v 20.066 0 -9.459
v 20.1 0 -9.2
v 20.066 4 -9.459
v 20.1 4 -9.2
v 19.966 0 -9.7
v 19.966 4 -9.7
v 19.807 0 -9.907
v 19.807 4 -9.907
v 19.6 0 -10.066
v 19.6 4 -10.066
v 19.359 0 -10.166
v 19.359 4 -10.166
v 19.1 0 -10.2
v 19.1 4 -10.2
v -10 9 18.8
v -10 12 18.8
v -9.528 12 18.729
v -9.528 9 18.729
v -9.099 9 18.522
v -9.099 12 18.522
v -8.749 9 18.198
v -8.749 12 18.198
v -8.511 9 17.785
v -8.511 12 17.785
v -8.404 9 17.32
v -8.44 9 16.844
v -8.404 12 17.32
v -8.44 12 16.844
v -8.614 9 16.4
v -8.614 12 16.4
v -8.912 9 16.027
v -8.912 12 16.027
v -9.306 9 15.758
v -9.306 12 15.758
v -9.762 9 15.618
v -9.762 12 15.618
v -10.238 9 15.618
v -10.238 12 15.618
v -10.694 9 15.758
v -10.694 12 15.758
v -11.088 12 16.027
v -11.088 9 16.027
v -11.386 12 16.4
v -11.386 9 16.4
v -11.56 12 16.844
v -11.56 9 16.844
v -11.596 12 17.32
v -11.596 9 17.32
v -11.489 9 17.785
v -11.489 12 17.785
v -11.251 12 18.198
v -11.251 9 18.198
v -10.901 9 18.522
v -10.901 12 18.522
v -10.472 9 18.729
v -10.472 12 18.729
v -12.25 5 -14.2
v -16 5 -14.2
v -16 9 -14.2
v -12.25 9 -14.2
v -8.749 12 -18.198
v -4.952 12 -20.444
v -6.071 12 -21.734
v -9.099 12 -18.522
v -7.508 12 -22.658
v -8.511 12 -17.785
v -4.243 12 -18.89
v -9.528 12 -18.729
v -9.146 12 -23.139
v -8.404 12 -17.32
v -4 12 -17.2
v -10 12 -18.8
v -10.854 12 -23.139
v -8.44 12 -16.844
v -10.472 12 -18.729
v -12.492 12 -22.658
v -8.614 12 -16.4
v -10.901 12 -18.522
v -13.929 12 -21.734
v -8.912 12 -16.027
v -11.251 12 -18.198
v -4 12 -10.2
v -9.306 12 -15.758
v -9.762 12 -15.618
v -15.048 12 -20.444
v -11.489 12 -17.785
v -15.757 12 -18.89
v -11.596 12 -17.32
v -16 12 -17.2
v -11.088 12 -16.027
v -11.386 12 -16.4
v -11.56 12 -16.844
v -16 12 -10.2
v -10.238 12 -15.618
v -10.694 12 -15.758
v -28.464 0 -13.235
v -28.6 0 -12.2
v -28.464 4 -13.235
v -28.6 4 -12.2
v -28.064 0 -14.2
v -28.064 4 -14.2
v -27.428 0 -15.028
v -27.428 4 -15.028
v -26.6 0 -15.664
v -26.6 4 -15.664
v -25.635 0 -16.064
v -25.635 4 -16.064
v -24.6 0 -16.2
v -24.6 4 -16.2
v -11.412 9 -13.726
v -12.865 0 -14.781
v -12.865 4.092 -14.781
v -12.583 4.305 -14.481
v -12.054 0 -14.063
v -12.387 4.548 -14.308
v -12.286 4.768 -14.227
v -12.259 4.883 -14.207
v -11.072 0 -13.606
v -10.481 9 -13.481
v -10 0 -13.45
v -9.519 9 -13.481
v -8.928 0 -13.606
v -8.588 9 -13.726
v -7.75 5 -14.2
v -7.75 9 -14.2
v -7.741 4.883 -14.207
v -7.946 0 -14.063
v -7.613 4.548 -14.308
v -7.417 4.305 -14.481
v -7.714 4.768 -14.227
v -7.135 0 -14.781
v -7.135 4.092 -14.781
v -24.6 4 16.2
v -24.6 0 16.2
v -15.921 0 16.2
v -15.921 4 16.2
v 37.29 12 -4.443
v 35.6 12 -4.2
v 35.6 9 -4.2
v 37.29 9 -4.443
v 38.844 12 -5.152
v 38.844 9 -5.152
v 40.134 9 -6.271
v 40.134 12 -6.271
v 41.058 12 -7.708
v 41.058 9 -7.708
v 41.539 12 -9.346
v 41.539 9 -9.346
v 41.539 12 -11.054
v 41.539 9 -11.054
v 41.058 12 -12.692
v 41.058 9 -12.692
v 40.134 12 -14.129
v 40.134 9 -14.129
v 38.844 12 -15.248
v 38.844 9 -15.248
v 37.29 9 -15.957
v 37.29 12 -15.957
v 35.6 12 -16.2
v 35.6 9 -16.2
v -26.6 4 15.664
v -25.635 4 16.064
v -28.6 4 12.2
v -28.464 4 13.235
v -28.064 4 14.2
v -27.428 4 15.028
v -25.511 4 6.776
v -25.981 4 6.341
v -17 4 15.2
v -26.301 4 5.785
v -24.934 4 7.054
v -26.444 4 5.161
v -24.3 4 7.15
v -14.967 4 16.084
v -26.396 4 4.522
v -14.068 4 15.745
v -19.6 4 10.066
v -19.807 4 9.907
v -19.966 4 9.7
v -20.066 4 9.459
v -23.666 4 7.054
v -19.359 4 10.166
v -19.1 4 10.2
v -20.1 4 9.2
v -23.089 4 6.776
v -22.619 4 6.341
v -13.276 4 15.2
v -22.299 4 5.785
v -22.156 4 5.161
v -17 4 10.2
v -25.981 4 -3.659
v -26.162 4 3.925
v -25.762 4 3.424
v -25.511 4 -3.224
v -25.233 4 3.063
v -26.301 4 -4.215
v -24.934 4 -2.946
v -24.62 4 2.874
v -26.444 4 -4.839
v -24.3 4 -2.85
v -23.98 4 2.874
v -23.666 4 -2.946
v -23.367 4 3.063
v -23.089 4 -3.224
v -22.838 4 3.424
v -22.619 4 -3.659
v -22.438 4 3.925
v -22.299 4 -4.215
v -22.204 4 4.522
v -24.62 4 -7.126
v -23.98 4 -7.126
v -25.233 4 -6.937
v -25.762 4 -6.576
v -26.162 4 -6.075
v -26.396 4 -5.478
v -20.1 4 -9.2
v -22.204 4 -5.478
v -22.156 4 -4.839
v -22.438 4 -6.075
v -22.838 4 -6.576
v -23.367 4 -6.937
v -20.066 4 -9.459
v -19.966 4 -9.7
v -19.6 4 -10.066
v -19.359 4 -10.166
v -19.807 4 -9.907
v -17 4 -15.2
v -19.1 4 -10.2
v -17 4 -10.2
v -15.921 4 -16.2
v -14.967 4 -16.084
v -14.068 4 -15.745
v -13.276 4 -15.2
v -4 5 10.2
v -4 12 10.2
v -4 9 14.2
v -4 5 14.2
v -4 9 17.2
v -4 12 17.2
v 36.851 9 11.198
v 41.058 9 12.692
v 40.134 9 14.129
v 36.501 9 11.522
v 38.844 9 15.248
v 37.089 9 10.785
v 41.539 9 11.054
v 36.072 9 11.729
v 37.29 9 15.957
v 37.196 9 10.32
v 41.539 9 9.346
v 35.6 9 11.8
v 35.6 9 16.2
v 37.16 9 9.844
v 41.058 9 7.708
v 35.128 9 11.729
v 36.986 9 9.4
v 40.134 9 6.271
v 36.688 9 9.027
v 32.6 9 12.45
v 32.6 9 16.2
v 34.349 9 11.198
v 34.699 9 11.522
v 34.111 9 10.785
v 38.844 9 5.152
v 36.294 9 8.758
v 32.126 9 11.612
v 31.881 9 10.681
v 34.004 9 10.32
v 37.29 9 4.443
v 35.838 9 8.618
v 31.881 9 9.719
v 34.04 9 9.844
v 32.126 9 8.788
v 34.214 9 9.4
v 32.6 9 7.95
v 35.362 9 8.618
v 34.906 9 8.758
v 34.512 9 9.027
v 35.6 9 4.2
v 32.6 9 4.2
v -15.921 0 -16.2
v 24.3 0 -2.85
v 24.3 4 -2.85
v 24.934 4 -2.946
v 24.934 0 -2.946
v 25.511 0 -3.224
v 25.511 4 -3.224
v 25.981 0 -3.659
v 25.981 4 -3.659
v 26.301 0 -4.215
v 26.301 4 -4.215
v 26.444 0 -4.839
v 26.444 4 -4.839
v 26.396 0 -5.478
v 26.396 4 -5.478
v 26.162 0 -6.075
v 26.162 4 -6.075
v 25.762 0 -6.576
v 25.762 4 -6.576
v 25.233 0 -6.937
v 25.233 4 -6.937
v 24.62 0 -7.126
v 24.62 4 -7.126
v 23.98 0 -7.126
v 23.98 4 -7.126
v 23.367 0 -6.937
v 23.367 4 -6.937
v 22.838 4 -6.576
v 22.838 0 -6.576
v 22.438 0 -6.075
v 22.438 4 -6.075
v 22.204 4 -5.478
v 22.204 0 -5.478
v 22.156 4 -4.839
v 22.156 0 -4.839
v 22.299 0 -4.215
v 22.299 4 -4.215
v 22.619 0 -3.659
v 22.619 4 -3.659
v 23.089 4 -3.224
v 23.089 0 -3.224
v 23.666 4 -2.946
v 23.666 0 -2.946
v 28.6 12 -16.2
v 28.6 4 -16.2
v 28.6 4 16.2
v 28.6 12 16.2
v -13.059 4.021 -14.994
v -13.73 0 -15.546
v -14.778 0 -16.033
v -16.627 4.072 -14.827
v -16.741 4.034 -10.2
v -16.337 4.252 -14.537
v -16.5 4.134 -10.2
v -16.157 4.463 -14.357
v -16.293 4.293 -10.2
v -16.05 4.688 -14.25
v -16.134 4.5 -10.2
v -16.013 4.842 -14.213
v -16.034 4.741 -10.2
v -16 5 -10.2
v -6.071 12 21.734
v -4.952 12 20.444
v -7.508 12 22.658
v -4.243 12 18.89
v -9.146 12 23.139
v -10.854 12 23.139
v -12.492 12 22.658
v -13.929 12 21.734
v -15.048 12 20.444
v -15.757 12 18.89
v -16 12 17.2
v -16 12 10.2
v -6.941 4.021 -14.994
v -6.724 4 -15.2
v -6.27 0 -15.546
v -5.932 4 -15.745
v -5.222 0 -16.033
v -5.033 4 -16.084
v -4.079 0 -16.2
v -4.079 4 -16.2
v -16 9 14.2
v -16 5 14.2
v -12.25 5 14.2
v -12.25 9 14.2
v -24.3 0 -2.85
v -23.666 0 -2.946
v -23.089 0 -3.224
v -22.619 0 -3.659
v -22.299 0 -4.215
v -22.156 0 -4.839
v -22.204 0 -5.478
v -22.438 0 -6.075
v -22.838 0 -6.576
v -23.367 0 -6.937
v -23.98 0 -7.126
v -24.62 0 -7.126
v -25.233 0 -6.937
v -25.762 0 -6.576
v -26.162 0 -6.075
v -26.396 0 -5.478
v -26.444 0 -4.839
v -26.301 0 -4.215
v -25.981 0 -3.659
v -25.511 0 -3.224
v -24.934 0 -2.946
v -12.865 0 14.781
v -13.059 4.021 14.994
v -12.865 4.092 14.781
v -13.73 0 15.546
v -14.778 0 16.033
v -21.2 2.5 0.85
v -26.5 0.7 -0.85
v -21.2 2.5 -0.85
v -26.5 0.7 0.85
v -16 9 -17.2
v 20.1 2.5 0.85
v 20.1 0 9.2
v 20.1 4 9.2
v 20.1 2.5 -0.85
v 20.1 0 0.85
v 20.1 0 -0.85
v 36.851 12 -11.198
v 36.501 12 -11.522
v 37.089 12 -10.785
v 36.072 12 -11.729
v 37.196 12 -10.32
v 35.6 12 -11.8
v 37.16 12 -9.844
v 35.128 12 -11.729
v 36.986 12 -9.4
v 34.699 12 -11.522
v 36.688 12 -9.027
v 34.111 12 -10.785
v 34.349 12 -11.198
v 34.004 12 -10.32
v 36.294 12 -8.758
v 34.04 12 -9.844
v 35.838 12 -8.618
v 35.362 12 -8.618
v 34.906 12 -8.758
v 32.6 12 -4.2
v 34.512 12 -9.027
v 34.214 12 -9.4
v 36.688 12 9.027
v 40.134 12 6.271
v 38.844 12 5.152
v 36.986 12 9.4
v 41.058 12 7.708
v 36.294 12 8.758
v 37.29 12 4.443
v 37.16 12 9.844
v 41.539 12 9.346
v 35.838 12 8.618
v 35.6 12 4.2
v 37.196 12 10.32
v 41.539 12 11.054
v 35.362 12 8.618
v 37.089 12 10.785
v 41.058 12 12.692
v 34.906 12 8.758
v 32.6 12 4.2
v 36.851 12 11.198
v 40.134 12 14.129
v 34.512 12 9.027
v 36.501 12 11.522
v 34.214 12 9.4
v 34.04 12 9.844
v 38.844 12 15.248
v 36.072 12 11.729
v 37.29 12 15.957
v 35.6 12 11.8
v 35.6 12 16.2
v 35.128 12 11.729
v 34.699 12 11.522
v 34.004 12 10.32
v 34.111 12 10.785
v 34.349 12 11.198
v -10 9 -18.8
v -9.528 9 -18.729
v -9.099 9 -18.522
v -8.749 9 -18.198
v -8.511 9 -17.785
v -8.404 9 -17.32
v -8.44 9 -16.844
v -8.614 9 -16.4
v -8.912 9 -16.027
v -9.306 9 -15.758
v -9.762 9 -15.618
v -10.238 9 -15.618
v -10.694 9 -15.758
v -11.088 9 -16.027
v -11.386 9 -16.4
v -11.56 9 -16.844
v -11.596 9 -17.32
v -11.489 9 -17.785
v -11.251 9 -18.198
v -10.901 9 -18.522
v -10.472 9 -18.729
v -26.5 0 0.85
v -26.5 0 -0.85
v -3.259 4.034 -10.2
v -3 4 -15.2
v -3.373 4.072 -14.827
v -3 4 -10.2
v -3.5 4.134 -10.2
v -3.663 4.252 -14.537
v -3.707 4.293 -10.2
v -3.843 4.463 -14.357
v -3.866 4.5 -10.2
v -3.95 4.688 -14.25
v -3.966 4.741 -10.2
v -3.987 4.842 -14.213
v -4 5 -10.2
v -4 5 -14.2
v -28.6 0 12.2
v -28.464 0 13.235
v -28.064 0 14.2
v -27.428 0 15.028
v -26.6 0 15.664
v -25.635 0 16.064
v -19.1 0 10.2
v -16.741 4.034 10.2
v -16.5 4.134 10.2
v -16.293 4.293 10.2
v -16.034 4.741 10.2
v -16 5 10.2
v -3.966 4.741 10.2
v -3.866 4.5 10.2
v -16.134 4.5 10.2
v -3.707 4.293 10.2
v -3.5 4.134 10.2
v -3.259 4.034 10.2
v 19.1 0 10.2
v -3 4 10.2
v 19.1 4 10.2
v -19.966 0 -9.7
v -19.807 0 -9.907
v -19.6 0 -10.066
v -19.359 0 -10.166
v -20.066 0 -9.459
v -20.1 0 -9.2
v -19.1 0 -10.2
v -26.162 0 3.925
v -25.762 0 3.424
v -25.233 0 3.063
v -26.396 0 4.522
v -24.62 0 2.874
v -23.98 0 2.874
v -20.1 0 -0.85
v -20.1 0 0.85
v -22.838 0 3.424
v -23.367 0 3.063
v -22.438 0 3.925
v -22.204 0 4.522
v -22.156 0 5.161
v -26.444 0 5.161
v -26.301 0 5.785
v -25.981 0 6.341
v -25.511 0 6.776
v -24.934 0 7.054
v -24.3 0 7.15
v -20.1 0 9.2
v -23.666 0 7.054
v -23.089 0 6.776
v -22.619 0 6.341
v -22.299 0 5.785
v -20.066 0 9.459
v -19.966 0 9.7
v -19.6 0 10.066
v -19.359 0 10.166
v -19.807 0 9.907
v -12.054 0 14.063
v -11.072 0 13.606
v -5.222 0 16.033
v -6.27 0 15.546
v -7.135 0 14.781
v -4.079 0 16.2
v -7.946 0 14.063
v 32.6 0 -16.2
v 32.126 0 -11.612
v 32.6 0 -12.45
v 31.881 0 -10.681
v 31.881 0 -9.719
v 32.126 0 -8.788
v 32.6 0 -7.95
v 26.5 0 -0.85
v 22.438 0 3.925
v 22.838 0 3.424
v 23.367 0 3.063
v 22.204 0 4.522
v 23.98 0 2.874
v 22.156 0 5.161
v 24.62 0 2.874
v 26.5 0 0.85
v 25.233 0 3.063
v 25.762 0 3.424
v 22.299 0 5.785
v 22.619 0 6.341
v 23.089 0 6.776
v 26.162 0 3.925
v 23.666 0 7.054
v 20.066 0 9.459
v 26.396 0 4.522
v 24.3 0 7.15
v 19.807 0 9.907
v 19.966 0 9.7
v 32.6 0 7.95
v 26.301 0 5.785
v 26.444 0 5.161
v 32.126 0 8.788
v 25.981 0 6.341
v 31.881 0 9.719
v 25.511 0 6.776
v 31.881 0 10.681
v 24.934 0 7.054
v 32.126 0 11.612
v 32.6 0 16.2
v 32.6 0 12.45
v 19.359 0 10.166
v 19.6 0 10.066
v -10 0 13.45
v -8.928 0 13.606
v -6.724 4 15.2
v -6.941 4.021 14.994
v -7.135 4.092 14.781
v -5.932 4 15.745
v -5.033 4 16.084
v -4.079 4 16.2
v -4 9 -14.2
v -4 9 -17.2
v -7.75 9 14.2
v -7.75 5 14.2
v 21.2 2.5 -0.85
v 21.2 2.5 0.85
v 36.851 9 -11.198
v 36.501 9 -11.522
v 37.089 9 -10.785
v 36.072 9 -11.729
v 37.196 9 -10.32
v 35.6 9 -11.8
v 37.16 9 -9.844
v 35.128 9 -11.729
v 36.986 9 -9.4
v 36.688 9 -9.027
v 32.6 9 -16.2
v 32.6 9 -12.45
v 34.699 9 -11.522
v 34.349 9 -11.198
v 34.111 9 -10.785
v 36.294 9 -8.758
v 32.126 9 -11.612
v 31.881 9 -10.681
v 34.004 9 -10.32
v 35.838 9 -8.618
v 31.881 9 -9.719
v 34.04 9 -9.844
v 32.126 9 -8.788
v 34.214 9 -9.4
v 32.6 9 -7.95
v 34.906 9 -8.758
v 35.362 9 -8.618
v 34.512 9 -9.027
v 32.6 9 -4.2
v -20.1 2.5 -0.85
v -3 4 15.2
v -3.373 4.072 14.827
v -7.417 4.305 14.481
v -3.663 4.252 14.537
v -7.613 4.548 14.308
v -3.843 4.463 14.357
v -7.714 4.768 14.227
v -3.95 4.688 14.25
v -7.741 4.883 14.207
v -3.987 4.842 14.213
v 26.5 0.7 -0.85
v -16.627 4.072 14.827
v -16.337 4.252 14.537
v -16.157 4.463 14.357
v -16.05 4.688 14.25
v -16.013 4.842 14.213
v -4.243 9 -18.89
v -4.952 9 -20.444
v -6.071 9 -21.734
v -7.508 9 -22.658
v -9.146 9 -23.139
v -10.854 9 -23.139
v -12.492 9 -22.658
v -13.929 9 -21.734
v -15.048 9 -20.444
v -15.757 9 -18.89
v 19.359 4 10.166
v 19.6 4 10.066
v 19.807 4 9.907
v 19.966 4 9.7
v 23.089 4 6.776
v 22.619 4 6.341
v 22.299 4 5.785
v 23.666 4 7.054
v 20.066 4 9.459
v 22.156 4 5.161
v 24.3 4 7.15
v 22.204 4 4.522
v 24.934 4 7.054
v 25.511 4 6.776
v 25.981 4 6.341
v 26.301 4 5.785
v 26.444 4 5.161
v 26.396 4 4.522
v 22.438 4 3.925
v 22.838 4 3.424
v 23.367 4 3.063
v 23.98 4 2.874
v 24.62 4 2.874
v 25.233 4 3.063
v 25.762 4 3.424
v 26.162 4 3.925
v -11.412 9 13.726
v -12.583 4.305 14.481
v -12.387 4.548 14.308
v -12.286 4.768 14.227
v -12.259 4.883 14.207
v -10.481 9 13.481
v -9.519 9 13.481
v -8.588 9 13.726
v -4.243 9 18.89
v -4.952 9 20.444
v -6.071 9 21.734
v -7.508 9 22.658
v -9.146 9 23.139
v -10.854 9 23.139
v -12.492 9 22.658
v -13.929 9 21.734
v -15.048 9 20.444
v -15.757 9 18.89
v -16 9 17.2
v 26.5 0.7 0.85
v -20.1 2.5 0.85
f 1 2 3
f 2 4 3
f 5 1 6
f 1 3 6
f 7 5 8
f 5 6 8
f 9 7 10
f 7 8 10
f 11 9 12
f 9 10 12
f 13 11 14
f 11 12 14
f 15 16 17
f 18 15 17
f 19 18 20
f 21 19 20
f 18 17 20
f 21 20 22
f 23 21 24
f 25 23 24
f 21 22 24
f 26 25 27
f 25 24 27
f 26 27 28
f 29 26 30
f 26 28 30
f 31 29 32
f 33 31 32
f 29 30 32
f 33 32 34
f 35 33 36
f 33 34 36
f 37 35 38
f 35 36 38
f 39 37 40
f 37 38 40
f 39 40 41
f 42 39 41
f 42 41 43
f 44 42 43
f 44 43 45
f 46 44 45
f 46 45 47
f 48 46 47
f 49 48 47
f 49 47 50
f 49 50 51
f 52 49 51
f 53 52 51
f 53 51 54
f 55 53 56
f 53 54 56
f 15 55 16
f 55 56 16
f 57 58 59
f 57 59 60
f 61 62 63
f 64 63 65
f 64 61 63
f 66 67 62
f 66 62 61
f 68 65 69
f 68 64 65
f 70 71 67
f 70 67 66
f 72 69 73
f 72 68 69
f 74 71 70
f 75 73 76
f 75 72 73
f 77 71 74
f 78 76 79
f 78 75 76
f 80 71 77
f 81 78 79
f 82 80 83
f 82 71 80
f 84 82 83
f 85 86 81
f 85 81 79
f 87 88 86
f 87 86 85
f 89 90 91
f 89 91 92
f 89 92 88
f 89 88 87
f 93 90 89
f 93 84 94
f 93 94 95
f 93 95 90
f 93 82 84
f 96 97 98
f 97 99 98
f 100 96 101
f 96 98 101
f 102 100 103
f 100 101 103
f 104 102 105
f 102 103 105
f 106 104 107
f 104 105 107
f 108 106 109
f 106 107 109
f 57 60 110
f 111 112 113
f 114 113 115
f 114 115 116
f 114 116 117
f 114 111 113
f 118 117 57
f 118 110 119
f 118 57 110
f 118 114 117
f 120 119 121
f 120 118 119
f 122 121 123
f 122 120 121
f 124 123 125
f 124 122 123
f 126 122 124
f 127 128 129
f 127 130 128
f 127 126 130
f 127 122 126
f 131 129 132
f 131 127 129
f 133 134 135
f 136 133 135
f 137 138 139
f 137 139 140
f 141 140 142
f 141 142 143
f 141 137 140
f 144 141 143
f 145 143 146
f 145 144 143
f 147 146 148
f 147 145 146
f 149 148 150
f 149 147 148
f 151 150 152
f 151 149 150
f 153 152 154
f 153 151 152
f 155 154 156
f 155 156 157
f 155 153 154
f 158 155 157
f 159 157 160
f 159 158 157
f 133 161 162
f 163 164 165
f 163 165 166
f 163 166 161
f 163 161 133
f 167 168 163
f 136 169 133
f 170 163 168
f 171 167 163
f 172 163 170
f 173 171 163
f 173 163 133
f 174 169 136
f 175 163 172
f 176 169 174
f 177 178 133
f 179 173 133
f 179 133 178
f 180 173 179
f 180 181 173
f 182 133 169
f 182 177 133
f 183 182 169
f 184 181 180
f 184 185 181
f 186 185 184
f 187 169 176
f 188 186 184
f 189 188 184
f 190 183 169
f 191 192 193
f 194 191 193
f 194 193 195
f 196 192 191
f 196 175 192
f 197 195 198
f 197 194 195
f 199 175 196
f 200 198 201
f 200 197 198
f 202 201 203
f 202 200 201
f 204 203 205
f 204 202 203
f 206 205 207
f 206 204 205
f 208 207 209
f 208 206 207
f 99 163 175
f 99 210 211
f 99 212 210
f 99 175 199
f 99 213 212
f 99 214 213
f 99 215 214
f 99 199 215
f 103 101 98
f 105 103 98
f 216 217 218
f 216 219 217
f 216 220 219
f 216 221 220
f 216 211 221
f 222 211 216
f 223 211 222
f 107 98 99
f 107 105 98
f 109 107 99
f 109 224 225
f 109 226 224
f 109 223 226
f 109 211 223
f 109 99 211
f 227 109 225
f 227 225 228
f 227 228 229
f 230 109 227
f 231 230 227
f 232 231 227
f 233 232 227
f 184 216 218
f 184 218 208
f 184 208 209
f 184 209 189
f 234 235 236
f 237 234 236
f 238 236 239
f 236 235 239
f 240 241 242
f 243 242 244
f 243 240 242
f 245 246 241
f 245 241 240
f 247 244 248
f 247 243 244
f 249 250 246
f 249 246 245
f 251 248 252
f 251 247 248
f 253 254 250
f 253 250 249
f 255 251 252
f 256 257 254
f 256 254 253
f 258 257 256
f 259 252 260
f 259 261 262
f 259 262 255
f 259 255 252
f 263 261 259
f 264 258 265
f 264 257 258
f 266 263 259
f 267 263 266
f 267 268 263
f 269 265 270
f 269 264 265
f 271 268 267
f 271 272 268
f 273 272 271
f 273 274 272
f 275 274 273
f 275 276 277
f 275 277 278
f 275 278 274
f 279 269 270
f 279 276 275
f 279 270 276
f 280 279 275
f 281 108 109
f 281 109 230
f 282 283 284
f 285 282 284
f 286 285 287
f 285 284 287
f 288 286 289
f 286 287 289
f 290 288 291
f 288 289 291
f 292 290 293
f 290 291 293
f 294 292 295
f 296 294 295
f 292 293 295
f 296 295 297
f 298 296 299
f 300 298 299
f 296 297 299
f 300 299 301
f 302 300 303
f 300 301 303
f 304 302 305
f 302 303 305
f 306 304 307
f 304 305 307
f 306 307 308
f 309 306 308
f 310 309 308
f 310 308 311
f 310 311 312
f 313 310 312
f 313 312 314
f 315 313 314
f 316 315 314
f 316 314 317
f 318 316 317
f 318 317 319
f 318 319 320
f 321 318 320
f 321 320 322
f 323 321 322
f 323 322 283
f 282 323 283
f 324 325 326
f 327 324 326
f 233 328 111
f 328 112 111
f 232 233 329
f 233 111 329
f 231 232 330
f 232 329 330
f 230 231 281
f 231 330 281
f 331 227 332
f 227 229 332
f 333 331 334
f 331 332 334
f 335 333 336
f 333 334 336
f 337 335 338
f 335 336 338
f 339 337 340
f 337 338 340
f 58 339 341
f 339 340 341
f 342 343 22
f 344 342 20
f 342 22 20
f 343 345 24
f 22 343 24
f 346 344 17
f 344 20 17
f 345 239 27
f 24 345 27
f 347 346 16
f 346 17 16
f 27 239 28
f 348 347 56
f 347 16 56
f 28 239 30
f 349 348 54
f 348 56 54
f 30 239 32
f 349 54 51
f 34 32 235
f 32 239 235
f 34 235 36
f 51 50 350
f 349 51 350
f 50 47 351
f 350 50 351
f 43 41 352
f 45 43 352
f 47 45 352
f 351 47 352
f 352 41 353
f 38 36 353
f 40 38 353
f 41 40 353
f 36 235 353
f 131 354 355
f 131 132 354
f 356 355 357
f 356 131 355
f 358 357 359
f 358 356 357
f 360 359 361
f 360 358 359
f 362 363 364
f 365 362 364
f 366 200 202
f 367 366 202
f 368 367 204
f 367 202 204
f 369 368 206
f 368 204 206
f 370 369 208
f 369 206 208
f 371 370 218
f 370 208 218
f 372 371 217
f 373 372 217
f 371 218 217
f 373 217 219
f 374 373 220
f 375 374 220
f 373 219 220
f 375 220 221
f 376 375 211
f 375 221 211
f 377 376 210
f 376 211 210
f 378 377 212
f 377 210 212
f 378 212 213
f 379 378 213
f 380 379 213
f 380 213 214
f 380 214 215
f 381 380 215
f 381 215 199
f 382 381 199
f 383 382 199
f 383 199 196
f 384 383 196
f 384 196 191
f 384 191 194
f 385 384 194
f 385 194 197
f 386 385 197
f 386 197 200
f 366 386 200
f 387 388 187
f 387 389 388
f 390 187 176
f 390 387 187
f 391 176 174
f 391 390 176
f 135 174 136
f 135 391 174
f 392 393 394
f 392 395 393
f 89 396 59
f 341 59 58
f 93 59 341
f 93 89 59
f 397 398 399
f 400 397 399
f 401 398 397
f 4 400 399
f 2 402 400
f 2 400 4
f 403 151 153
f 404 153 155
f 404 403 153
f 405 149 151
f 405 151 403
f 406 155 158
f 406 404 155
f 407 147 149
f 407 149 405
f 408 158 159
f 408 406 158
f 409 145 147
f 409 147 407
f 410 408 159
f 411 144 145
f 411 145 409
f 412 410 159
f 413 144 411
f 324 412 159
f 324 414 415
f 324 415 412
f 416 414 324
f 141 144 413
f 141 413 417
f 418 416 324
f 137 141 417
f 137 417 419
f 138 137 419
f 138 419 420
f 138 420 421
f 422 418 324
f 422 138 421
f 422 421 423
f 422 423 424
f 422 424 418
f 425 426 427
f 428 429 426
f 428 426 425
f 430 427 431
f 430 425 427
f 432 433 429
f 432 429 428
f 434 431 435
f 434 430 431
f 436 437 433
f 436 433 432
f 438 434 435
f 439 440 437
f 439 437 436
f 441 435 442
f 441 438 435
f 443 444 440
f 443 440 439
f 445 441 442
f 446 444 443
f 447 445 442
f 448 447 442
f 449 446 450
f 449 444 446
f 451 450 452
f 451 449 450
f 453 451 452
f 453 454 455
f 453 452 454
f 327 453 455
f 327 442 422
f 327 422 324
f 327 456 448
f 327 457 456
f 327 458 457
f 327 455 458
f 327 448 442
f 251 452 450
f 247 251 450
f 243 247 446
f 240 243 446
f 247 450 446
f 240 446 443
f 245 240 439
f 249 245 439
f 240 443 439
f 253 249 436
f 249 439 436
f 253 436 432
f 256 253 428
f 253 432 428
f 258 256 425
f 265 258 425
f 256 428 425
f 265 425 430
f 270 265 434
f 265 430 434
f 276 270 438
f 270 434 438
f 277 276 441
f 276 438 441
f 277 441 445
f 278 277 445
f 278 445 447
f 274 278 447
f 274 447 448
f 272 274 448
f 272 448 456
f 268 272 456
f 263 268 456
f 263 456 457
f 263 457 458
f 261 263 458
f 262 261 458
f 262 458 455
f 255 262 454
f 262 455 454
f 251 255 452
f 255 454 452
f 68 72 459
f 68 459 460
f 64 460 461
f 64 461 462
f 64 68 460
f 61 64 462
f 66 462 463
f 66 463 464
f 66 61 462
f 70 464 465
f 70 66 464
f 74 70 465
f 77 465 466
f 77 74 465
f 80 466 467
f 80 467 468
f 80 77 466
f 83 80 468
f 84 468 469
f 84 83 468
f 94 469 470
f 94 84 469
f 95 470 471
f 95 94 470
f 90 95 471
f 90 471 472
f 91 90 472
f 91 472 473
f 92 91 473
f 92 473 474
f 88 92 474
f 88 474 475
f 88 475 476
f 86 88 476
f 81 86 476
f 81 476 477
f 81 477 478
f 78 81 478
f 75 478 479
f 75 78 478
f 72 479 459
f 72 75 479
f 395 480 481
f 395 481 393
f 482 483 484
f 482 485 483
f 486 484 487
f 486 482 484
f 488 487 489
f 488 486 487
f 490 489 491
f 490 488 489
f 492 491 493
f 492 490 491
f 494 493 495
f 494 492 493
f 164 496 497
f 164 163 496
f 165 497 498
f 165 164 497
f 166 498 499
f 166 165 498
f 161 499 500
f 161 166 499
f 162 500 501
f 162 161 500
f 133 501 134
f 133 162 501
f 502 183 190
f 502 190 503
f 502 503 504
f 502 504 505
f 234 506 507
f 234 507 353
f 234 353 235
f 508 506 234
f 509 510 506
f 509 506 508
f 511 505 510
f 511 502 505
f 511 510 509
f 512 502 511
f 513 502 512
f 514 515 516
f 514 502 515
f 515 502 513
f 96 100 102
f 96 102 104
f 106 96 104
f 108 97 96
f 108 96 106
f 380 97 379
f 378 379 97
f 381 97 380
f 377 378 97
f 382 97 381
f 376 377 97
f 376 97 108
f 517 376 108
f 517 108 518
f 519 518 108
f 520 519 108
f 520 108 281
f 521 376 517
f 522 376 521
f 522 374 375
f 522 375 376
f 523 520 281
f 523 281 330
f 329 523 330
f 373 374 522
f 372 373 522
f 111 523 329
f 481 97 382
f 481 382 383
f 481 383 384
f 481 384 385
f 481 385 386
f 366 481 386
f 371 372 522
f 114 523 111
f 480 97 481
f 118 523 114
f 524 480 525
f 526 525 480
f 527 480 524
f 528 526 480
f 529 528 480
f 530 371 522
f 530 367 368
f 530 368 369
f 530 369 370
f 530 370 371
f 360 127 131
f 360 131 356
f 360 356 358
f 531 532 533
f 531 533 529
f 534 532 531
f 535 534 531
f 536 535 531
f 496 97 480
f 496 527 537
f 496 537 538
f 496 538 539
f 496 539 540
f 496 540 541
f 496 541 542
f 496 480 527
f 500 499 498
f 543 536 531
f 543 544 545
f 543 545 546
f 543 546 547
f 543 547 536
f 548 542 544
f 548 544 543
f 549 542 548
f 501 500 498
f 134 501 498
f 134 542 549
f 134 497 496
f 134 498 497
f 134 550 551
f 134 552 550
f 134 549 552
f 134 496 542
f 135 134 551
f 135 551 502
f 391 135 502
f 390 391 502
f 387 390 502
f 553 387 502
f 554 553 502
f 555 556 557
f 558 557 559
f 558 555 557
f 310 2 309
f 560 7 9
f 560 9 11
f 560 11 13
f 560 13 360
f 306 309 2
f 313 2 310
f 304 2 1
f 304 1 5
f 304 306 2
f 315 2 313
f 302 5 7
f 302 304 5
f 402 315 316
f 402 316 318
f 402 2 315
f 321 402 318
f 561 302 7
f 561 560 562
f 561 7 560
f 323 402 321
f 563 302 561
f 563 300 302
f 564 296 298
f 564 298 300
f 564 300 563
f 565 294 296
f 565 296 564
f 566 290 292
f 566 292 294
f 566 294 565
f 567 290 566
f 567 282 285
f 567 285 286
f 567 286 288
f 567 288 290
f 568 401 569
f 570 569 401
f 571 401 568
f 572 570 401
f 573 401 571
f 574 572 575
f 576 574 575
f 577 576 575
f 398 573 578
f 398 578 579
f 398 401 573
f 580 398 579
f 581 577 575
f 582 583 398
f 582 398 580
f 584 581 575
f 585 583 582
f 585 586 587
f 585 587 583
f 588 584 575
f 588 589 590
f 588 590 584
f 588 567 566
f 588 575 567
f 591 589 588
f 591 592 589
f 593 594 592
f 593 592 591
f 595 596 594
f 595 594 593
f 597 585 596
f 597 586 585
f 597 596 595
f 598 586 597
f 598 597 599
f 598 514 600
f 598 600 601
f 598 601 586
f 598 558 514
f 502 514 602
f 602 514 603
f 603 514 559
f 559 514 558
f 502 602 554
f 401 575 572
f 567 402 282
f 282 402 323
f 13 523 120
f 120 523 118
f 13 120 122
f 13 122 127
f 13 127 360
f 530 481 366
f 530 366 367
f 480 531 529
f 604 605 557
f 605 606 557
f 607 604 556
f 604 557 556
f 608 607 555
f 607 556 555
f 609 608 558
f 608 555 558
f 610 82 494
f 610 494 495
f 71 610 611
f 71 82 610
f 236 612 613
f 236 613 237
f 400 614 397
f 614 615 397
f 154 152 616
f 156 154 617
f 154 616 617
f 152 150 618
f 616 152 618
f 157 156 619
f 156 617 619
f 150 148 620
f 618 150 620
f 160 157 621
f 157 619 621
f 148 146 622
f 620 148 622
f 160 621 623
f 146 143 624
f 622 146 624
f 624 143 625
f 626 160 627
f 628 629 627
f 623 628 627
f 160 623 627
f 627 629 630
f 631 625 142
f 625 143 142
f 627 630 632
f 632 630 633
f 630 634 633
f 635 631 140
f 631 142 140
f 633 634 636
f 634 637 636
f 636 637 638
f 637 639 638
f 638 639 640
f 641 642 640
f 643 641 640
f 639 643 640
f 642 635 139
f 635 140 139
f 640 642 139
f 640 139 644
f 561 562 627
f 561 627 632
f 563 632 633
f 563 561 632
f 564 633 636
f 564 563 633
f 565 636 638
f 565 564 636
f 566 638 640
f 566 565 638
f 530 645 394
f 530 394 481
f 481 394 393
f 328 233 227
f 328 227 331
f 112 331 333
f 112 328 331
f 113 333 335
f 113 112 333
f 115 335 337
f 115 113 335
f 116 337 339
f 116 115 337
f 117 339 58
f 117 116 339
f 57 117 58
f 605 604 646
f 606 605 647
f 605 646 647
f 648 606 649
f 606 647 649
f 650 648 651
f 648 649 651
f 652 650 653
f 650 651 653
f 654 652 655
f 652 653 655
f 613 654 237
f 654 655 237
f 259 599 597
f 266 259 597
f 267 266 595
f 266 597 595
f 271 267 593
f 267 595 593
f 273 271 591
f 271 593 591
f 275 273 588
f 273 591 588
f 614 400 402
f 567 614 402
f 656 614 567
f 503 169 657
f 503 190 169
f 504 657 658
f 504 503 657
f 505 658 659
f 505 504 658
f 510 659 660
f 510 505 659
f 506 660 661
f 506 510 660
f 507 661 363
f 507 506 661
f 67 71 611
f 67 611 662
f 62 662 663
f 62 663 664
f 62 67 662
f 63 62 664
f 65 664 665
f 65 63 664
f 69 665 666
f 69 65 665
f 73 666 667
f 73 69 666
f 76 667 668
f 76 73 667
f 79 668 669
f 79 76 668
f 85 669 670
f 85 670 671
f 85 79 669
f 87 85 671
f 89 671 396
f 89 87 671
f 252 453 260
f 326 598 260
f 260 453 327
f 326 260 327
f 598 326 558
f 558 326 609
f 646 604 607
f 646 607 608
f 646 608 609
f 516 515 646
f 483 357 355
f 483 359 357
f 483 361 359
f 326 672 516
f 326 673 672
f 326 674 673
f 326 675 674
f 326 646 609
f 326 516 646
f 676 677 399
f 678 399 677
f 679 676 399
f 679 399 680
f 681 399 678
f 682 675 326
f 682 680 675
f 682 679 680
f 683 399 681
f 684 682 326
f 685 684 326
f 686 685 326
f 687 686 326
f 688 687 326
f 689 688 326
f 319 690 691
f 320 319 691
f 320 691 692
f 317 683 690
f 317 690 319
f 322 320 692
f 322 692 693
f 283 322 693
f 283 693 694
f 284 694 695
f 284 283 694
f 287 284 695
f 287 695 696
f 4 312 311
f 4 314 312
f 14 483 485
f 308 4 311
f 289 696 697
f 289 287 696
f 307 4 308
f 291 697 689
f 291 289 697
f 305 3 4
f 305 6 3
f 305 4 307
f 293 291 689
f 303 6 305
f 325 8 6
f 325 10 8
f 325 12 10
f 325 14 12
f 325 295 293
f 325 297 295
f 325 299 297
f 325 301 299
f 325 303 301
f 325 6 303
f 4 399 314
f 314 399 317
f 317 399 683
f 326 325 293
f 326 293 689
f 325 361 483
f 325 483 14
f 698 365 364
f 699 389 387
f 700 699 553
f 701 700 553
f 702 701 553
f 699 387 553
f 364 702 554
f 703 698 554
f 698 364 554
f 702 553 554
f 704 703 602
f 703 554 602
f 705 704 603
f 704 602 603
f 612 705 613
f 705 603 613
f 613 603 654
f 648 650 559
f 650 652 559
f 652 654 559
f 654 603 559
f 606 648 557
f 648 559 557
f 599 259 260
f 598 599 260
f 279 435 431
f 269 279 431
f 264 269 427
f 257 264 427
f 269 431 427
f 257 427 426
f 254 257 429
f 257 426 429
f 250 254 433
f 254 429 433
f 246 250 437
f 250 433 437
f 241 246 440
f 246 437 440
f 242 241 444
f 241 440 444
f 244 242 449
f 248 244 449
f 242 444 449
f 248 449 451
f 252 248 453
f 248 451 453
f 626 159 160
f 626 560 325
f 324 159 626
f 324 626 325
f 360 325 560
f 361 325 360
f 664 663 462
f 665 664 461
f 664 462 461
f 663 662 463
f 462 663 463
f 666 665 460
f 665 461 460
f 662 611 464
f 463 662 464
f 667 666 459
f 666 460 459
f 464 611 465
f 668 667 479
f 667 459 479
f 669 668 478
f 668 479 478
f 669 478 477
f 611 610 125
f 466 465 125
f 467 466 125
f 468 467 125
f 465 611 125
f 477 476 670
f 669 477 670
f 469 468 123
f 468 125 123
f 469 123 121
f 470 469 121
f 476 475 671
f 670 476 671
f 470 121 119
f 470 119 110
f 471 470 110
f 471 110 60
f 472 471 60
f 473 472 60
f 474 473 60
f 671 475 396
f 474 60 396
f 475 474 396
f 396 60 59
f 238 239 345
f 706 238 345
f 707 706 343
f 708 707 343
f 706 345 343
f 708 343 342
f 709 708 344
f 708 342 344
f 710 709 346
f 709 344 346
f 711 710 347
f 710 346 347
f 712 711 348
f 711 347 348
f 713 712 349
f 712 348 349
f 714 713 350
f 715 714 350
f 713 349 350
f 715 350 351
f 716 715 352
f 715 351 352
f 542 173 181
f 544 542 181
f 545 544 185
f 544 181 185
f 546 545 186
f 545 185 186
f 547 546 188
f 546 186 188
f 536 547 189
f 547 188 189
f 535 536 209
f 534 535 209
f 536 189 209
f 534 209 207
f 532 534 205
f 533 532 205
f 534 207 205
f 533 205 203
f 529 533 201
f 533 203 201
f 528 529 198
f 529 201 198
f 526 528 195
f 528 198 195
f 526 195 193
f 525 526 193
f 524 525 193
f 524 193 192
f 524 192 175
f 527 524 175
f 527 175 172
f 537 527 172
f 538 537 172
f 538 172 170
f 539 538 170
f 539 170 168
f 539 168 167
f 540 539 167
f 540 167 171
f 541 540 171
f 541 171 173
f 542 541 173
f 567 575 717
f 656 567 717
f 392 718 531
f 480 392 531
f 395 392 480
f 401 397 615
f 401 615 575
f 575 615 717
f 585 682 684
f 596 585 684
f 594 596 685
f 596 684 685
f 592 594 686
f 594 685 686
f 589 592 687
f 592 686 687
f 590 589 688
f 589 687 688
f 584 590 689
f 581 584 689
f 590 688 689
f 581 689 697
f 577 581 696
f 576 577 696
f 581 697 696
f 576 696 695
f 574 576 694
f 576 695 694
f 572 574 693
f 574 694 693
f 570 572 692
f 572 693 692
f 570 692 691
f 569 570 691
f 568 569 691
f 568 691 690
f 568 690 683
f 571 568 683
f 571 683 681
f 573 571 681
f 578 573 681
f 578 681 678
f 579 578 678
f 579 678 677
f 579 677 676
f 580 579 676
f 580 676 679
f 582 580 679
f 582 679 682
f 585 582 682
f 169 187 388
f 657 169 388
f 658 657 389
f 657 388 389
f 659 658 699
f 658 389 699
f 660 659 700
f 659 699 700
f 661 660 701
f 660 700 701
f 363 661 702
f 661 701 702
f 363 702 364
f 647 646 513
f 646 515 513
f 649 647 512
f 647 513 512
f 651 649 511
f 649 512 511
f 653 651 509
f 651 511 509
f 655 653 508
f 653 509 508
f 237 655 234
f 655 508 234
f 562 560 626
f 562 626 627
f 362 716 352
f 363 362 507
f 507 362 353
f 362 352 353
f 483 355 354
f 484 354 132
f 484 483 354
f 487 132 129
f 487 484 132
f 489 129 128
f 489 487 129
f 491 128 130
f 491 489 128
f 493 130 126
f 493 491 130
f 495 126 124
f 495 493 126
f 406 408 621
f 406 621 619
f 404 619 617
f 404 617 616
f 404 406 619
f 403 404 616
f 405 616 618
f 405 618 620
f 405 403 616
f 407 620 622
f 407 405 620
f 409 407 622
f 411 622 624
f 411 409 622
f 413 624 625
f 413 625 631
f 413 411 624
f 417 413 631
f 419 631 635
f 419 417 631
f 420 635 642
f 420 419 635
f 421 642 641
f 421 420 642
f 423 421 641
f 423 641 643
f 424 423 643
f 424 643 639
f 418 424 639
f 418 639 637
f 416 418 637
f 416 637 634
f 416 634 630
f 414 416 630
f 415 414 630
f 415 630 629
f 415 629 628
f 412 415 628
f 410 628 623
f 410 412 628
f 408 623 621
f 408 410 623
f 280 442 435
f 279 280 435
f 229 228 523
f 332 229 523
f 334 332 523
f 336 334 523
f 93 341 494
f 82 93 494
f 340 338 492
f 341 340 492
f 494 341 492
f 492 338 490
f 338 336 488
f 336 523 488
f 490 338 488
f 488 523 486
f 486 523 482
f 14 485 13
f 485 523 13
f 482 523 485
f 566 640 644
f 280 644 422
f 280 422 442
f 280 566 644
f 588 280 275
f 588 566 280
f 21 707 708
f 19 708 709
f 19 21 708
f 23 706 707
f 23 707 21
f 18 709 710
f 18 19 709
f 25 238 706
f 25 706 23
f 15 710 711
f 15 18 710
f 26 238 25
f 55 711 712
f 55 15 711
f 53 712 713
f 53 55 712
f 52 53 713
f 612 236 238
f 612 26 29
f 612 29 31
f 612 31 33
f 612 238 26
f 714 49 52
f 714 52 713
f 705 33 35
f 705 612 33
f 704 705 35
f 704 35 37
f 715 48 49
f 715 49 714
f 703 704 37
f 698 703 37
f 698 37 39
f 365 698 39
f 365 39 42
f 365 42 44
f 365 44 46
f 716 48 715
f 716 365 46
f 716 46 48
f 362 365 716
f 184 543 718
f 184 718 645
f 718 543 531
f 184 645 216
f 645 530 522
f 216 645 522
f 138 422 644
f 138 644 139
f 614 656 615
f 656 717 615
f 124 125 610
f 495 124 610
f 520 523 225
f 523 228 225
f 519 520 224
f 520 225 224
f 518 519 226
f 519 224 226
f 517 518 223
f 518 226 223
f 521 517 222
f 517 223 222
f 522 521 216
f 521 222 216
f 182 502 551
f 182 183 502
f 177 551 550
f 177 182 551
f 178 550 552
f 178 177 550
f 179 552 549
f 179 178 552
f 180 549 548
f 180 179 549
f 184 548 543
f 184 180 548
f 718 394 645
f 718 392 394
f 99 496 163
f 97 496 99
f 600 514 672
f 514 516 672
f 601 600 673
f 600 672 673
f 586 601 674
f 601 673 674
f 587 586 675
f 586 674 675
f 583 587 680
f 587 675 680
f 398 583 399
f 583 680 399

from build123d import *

# Parameters (mm, degrees)
SKETCH1_W           = 57.2
SKETCH1_H           = 32.4
SKETCH1_W_2         = 40.2
SKETCH1_H_2         = 20.4
BOSS_EXTRUDE1_DEPTH = 4
FILLET1_R           = 1
SKETCH2_R           = 2.15
CUT_EXTRUDE1_DEPTH  = 34.111931384
CUT_EXTRUDE2_DEPTH  = 0.85
SKETCH5_W           = 12
SKETCH5_H           = 4
BOSS_EXTRUDE2_DEPTH = 8
SKETCH6_R           = 1.6
BOSS_EXTRUDE3_DEPTH = 3
CUT_EXTRUDE3_REACH  = 40.732
SKETCH7_R           = 3.75
FILLET4_R           = 4
FILLET6_R           = 1
SKETCH8_W           = 4
SKETCH8_H           = 32.4
BOSS_EXTRUDE4_DEPTH = 12
SKETCH9_R           = 1.6
BOSS_EXTRUDE6_DEPTH = 3
SKETCH10_R          = 3.75
CUT_EXTRUDE4_DEPTH  = 9


with BuildPart() as part:
    # Sketch1 → Boss-Extrude1 (new body)
    with BuildSketch(Plane(origin=(0, 0, 0), x_dir=(1, 0, 0), z_dir=(0, 1, 0))):
        Rectangle(SKETCH1_W, SKETCH1_H)
        Rectangle(SKETCH1_W_2, SKETCH1_H_2, mode=Mode.SUBTRACT)
    extrude(amount=BOSS_EXTRUDE1_DEPTH)

    # Fillet1
    fillet1_edges = [part.edges().sort_by_distance(p)[0] for p in [
        (-20.1, 2, -10.2),
        (-20.1, 2, 10.2),
        (20.1, 2, 10.2),
        (20.1, 2, -10.2),
    ]]
    fillet(fillet1_edges, radius=FILLET1_R)

    # Sketch2 → Cut-Extrude1 (cut, through all)
    with BuildSketch(Plane(origin=(0, 4, 0), x_dir=(1, 0, 0), z_dir=(0, 1, 0))):
        with Locations(Location((-24.3, 5, 0), (0, 0, 270))):
            Circle(SKETCH2_R)
        with Locations(Location((-24.3, -5, 0), (0, 0, 270))):
            Circle(SKETCH2_R)
        with Locations(Location((24.3, -5, 0), (0, 0, 270))):
            Circle(SKETCH2_R)
        with Locations(Location((24.3, 5, 0), (0, 0, 270))):
            Circle(SKETCH2_R)
    extrude(amount=-CUT_EXTRUDE1_DEPTH, mode=Mode.SUBTRACT)

    # Sketch3 → Cut-Extrude2 (cut, symmetric)
    with BuildSketch(Plane.XY):
        Polygon((-26.5, 0), (-26.5, 0.7), (-21.2, 2.5), (-20.1, 2.5), (-20.1, 0), align=None)
    cut_extrude2 = extrude(amount=CUT_EXTRUDE2_DEPTH, both=True, mode=Mode.SUBTRACT)

    # Mirror1: Cut-Extrude2 across plane
    add(cut_extrude2.mirror(Plane(origin=(0, 0, 0), x_dir=(0, 0, 1), z_dir=(1, 0, 0))), mode=Mode.SUBTRACT)

    # Sketch5 → Boss-Extrude2 (add)
    with BuildSketch(Plane(origin=(0, 4, 0), x_dir=(1, 0, 0), z_dir=(0, 1, 0))):
        with Locations((-10, -12.2)):
            Rectangle(SKETCH5_W, SKETCH5_H)
    boss_extrude2 = extrude(amount=BOSS_EXTRUDE2_DEPTH)

    # Sketch6 → Boss-Extrude3 (add)
    with BuildSketch(Plane(origin=(0, 12, 0), x_dir=(1, 0, 0), z_dir=(0, 1, 0))):
        with BuildLine():
            Line((-16, -14.2), (-4, -14.2))
            Line((-4, -14.2), (-4, -17.2))
            ThreePointArc((-4, -17.2), (-10, -23.2), (-16, -17.2))
            Line((-16, -17.2), (-16, -14.2))
        make_face()
        with Locations(Location((-10, -17.2, 0), (0, 0, 270))):
            Circle(SKETCH6_R, mode=Mode.SUBTRACT)
    boss_extrude3 = extrude(amount=-BOSS_EXTRUDE3_DEPTH)

    # Cut-Extrude3: up to this face of the body (flat: up to its plane)
    cut_extrude3_end = Plane(part.part.faces().sort_by_distance((-10, 9, 23.05))[0])
    # Sketch7 → Cut-Extrude3 (cut, up to the picked face)
    with BuildSketch(Plane.XZ, mode=Mode.PRIVATE) as cut_extrude3_sk1:
        with Locations((-10, 17.2)):
            Circle(SKETCH7_R)
    cut_extrude3_tool1 = split(extrude(cut_extrude3_sk1.sketch, amount=-CUT_EXTRUDE3_REACH, mode=Mode.PRIVATE), bisect_by=cut_extrude3_end, keep=Keep.BOTH, mode=Mode.PRIVATE)
    cut_extrude3 = cut_extrude3_tool1.solids().sort_by(Axis((-10, 0, 17.2), (0, 1, 0)))[0]
    add(cut_extrude3, mode=Mode.SUBTRACT)

    # Mirror4: Boss-Extrude2, Boss-Extrude3, Cut-Extrude3 across plane
    add(boss_extrude2.mirror(Plane.XY))
    add(boss_extrude3.mirror(Plane.XY))
    add(cut_extrude3.mirror(Plane.XY), mode=Mode.SUBTRACT)

    # Fillet4
    fillet4_edges = [part.edges().sort_by_distance(p)[0] for p in [
        (-6.385791926, 2, 16.2),
        (-13.614208074, 2, 16.2),
        (-6.385791926, 2, -16.2),
        (-13.614208074, 2, -16.2),
        (-28.6, 2, -16.2),
        (-28.6, 2, 16.2),
    ]]
    fillet(fillet4_edges, radius=FILLET4_R)

    # Fillet6
    fillet6_edges = [part.edges().sort_by_distance(p)[0] for p in [
        (-14.125, 4, 14.2),
        (-16, 4, 12.2),
        (-5.875, 4, -14.2),
        (-14.125, 4, -14.2),
        (-4, 4, -12.2),
        (-16, 4, -12.2),
        (-4, 4, 12.2),
        (-5.875, 4, 14.2),
    ]]
    fillet(fillet6_edges, radius=FILLET6_R)

    # Sketch8 → Boss-Extrude4 (add)
    with BuildSketch(Plane.XZ):
        with Locations((30.6, 0)):
            Rectangle(SKETCH8_W, SKETCH8_H)
    extrude(amount=-BOSS_EXTRUDE4_DEPTH)

    # Sketch9 → Boss-Extrude6 (add)
    with BuildSketch(Plane(origin=(0, 12, 0), x_dir=(1, 0, 0), z_dir=(0, 1, 0))):
        with BuildLine():
            Line((32.6, -16.2), (32.6, -4.2))
            Line((32.6, -4.2), (35.6, -4.2))
            ThreePointArc((35.6, -4.2), (41.6, -10.2), (35.6, -16.2))
            Line((35.6, -16.2), (32.6, -16.2))
        make_face()
        with Locations(Location((35.6, -10.2, 0), (0, 0, 270))):
            Circle(SKETCH9_R, mode=Mode.SUBTRACT)
    boss_extrude6 = extrude(amount=-BOSS_EXTRUDE6_DEPTH)

    # Sketch10 → Cut-Extrude4 (cut)
    with BuildSketch(Plane.XZ):
        with Locations((35.6, 10.2)):
            Circle(SKETCH10_R)
    cut_extrude4 = extrude(amount=-CUT_EXTRUDE4_DEPTH, mode=Mode.SUBTRACT)

    # Mirror5: Boss-Extrude6, Cut-Extrude4 across plane
    add(boss_extrude6.mirror(Plane.XY))
    add(cut_extrude4.mirror(Plane.XY), mode=Mode.SUBTRACT)


solid = part.part
